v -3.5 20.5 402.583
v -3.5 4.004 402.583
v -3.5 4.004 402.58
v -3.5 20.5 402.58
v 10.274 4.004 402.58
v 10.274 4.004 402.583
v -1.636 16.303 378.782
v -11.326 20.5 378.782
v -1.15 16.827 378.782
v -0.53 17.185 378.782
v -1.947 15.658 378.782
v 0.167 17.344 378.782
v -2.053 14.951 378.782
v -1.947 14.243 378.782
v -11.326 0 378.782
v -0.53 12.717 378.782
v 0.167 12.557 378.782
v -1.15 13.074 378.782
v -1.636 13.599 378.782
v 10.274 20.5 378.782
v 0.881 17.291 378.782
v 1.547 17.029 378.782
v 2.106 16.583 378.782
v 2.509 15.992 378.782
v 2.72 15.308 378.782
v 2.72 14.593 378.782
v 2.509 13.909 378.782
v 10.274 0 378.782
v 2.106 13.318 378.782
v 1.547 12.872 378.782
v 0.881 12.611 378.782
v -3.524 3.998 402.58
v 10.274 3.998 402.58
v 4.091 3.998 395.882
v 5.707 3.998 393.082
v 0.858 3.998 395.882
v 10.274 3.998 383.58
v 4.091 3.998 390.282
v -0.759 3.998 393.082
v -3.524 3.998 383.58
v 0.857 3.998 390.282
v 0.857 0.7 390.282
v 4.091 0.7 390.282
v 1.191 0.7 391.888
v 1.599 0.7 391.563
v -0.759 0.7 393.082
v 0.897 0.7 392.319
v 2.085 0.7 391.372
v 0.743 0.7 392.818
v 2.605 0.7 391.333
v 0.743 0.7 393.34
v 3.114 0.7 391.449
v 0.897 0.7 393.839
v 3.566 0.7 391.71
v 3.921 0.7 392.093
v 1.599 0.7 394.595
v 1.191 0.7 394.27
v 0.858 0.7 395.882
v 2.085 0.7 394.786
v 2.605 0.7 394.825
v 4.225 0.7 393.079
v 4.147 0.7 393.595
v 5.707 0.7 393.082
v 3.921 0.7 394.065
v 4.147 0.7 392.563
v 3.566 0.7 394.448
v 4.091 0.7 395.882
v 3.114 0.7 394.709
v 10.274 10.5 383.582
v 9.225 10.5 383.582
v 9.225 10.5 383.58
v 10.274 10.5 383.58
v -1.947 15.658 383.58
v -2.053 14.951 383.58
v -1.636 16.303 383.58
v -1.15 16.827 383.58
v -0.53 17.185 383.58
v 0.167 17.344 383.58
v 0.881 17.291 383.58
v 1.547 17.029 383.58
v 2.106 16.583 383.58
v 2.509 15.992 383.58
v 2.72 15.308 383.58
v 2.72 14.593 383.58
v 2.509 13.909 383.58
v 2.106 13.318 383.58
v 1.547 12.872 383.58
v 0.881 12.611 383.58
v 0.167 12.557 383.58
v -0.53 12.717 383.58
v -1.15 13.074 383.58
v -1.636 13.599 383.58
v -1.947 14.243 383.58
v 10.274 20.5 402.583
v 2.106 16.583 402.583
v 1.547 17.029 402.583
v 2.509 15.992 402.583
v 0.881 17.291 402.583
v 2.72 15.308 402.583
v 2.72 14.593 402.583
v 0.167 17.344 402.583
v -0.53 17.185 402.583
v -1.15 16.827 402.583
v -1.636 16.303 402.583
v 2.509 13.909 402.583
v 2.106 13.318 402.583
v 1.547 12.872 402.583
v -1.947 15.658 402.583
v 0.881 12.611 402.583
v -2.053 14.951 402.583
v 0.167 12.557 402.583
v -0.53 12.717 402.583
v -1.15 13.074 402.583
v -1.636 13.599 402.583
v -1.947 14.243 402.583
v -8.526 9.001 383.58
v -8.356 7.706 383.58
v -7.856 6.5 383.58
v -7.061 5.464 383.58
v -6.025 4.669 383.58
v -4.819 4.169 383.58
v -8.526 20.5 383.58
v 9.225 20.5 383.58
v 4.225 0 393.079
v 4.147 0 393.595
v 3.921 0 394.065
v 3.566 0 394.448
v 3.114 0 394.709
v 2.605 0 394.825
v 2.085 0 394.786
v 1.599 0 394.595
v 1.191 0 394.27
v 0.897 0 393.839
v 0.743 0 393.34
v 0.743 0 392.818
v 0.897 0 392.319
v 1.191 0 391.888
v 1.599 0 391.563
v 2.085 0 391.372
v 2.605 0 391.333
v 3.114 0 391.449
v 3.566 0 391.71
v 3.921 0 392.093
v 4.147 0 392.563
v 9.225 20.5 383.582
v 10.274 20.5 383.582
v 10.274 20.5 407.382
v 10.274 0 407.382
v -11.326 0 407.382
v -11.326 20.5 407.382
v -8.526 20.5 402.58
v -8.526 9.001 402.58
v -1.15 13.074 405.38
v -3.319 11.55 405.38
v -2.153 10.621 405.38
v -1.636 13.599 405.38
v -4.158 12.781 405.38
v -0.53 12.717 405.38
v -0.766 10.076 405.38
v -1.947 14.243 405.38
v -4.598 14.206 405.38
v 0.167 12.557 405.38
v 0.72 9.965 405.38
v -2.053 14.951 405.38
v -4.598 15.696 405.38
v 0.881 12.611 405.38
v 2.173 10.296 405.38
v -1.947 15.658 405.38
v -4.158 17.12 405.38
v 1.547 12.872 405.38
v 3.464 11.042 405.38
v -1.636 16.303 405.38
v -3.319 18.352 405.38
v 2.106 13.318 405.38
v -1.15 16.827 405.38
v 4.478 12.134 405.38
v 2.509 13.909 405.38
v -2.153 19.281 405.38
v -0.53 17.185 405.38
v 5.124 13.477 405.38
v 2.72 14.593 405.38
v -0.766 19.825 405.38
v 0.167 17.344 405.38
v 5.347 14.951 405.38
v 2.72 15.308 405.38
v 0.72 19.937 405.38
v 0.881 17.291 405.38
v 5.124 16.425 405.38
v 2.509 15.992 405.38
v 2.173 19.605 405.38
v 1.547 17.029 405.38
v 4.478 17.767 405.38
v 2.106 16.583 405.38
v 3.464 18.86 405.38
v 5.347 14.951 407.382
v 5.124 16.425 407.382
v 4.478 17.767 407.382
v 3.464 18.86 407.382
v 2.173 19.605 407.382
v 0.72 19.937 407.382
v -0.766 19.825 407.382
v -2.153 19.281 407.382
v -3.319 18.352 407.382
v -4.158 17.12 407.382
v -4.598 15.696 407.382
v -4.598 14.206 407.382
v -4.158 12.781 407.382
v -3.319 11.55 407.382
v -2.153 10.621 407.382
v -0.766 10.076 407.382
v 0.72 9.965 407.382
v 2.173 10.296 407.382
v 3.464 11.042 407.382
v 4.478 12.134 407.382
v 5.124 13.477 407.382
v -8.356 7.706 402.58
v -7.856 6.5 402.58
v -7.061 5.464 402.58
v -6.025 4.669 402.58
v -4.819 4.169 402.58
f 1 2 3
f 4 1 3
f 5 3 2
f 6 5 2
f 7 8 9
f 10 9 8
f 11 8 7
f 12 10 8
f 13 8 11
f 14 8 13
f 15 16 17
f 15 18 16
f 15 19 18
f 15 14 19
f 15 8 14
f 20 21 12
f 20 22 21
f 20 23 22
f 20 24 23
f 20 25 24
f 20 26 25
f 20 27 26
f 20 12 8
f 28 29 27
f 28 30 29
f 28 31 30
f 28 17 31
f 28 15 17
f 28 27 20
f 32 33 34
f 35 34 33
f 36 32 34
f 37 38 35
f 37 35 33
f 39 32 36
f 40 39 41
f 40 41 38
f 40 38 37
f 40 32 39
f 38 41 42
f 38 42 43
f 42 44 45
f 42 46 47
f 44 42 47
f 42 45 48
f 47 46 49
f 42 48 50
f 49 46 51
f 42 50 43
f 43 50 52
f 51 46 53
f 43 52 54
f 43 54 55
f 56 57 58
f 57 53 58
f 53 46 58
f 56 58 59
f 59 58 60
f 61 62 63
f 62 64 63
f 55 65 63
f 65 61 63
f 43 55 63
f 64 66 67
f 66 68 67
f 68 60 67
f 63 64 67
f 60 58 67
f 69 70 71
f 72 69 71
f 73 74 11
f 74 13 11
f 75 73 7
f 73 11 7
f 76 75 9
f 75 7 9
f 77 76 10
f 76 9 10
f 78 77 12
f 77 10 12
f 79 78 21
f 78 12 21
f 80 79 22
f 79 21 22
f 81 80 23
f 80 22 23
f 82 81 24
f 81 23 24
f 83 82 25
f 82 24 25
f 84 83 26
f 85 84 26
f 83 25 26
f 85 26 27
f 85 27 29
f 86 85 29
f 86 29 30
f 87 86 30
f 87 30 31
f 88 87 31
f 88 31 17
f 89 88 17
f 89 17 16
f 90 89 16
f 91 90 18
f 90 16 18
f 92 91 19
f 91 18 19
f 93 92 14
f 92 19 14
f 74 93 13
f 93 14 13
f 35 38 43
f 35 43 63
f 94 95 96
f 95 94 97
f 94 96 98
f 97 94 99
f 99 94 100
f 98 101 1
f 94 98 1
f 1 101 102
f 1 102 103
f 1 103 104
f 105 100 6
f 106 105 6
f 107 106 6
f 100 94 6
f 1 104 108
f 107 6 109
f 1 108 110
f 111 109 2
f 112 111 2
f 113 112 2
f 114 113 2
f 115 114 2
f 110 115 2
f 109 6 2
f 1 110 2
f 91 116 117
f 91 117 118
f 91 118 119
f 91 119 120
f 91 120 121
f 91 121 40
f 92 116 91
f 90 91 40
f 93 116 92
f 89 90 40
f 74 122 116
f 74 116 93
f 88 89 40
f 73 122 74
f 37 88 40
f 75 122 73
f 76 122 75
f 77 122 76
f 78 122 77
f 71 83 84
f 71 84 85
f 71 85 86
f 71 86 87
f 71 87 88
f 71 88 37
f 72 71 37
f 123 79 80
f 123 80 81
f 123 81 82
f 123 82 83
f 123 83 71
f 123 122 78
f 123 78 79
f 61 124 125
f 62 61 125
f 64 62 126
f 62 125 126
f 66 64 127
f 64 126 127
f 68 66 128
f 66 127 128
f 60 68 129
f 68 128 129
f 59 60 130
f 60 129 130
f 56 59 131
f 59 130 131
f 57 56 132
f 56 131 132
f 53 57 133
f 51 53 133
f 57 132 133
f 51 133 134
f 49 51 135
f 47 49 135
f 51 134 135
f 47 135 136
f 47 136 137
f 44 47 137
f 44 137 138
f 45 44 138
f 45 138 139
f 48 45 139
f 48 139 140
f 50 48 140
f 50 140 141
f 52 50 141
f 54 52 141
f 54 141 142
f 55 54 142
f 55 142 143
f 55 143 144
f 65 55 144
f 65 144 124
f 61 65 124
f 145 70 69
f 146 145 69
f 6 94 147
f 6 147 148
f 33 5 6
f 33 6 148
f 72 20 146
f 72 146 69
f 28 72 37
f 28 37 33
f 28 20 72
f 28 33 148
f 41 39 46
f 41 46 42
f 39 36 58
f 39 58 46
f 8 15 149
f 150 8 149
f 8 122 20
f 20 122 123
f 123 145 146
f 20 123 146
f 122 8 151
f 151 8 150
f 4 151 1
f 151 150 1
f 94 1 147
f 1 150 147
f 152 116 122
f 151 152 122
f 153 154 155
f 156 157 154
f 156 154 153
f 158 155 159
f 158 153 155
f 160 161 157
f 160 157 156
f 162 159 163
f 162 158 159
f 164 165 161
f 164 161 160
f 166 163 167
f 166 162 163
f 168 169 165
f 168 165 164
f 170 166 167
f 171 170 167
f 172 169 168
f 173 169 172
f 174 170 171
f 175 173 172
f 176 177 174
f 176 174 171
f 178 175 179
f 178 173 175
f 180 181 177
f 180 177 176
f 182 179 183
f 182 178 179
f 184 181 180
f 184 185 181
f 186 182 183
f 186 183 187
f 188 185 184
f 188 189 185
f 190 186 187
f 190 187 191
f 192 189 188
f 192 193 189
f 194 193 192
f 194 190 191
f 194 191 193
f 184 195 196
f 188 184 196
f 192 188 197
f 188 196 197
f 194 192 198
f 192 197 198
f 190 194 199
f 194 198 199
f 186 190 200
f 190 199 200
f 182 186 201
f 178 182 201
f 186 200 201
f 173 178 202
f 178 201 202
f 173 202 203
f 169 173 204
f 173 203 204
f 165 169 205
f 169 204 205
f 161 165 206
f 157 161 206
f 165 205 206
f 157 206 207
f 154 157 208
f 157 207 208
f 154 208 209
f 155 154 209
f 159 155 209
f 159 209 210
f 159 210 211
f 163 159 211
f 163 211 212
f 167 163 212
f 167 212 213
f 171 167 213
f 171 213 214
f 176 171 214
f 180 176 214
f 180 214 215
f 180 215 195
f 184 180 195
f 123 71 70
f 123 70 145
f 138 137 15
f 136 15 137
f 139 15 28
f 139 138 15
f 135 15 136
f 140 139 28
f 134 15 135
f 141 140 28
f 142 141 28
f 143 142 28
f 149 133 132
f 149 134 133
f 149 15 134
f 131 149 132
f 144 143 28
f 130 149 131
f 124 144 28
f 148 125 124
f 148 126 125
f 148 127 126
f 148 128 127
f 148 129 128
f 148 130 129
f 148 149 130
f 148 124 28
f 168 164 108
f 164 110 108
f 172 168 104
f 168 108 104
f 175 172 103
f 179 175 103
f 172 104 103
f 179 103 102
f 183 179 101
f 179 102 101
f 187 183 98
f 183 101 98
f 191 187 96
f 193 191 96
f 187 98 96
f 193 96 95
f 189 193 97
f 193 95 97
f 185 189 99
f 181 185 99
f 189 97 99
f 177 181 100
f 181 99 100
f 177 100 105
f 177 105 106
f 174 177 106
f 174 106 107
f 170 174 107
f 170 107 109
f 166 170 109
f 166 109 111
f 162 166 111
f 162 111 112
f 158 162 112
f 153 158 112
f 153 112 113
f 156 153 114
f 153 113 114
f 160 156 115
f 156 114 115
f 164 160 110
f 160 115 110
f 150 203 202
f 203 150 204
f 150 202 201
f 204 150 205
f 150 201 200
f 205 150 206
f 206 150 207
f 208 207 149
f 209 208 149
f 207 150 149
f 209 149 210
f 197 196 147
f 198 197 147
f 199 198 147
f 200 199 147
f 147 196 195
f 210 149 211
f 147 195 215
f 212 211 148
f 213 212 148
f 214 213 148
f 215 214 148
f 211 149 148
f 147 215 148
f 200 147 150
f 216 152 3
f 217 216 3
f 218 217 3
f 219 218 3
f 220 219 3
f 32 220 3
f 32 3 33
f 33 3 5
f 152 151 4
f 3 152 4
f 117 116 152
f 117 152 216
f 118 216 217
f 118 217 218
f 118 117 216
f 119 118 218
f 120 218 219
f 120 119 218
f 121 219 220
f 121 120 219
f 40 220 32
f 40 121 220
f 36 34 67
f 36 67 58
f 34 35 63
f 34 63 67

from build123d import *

# Parameters (mm, degrees)
SKETCH_W           = 23.599997
SKETCH_H           = 28.600128
SKETCH_R           = 1.75088
PAD_DEPTH          = 20.5
HOLE_D             = 4.8
HOLE_DEPTH         = 34
HOLE_CBORE_D       = 10
HOLE_CBORE_DEPTH   = 2.02
SKETCH002_W        = 6.496036
SKETCH002_H        = 19.001464
POCKET_DEPTH       = 19
POCKET001_DEPTH    = 19
POCKET001_FACE20_W = 6.501685
POCKET001_FACE20_H = 19
POCKET002_DEPTH    = 40
POCKET003_DEPTH    = 3.3
POCKET004_DEPTH    = 5
POCKET004_FACE5_W  = 20.5
POCKET004_FACE5_H  = 28.600128
POCKET005_DEPTH    = 2
POCKET006_DEPTH    = 20


with BuildPart() as part:
    # Sketch → Pad (new body)
    with BuildSketch(Plane.XZ):
        with Locations((0.4742105, 393.081741)):
            Rectangle(SKETCH_W, SKETCH_H)
        with Locations((2.474405, 393.078932)):
            Circle(SKETCH_R, mode=Mode.SUBTRACT)
    extrude(amount=-PAD_DEPTH)

    # Hole
    with Locations(Plane.XY.offset(407.4)):
        with Locations((0.346603, 14.950747)):
            CounterBoreHole(HOLE_D / 2, HOLE_CBORE_D / 2, HOLE_CBORE_DEPTH, depth=HOLE_DEPTH)

    # Sketch002 → Pocket (cut)
    with BuildSketch(Plane.YZ.offset(-3.5)):
        with Locations((7.252294, 393.082428)):
            Rectangle(SKETCH002_W, SKETCH002_H)
    extrude(amount=POCKET_DEPTH, mode=Mode.SUBTRACT)

    # Sketch003 → Pocket001 (cut)
    with BuildSketch(Plane.XY.offset(383.58)):
        with BuildLine():
            ThreePointArc((-8.5264420268, 9.000709), (-7.0612425813, 5.4638025679), (-3.5244, 3.998449))
            Line((-3.5244, 3.998449), (-3.5244, 10.500134))
            Line((-3.5244, 10.500134), (4.225286, 10.500134))
            Line((4.225286, 10.500134), (4.225286, 24.874678))
            Line((4.225286, 24.874678), (-8.5264420268, 21.309877))
            Line((-8.5264420268, 9.000709), (-8.5264420268, 21.309877))
        make_face()
    extrude(amount=POCKET001_DEPTH, mode=Mode.SUBTRACT)

    # Pocket001 Face20 → Pocket002 (cut)
    with BuildSketch(Plane(origin=(-3.5244, 7.2492915, 393.08), x_dir=(0, 1, 0), z_dir=(-1, 0, 0))):
        Rectangle(POCKET001_FACE20_W, POCKET001_FACE20_H)
    extrude(amount=-POCKET002_DEPTH, mode=Mode.SUBTRACT)

    # Sketch004 → Pocket003 (cut)
    with BuildSketch(Plane.XZ.offset(-4)):
        Polygon((0.857594, 395.881653), (-0.7589761165, 393.0817985758), (0.8574838835, 390.2818805758), (4.090514, 390.281817), (5.7070841165, 393.0816714242), (4.0906241165, 395.8815894242), align=None)
    extrude(amount=POCKET003_DEPTH, mode=Mode.SUBTRACT)

    # Pocket003 Face12 → Pocket004 (cut)
    with BuildSketch(Plane(origin=(4.225286, 15.5001559921, 393.0799999849), x_dir=(0, 1, 0), z_dir=(-1, 0, 0))):
        Polygon((4.9998440079, 9.4999999849), (-5.0000219921, 9.4999999849), (-5.0000219921, 9.4983039849), (-4.9998439921, 9.4983039849), (-4.9998439921, -9.5000000151), (4.9998440079, -9.5000000151), align=None)
    extrude(amount=-POCKET004_DEPTH, mode=Mode.SUBTRACT)

    # Pocket004 Face5 → Pocket005 (cut)
    with BuildSketch(Plane(origin=(12.274209, 11.051181849, 393.0817843597), x_dir=(0, -1, 0), z_dir=(1, 0, 0))):
        with Locations((0.801181849, 4.33597e-05)):
            Rectangle(POCKET004_FACE5_W, POCKET004_FACE5_H)
        Polygon((7.046905849, -9.5013756403), (0.550869849, -9.5013756403), (0.550869849, 9.5000883597), (0.551047849, 9.5000883597), (0.551047849, 9.5017843597), (7.052732849, 9.5017843597), (7.052732849, -9.4982156403), (7.046905849, -9.4982156403), align=None, mode=Mode.SUBTRACT)
    extrude(amount=-POCKET005_DEPTH, mode=Mode.SUBTRACT)

    # Pocket005 Face10 → Pocket006 (cut)
    with BuildSketch(Plane(origin=(9.7358804108, 10.500312, 393.1015544105), x_dir=(-1, 0, 0), z_dir=(0, -1, 0))):
        Polygon((13.2358804108, -9.4816055895), (13.2358804108, -9.4784455895), (0.5105944108, -9.4784455895), (0.5105944108, 9.5198584105), (-0.5383285892, 9.5198584105), (-0.5383285892, -9.4816055895), align=None)
    extrude(amount=-POCKET006_DEPTH, mode=Mode.SUBTRACT)


solid = part.part
